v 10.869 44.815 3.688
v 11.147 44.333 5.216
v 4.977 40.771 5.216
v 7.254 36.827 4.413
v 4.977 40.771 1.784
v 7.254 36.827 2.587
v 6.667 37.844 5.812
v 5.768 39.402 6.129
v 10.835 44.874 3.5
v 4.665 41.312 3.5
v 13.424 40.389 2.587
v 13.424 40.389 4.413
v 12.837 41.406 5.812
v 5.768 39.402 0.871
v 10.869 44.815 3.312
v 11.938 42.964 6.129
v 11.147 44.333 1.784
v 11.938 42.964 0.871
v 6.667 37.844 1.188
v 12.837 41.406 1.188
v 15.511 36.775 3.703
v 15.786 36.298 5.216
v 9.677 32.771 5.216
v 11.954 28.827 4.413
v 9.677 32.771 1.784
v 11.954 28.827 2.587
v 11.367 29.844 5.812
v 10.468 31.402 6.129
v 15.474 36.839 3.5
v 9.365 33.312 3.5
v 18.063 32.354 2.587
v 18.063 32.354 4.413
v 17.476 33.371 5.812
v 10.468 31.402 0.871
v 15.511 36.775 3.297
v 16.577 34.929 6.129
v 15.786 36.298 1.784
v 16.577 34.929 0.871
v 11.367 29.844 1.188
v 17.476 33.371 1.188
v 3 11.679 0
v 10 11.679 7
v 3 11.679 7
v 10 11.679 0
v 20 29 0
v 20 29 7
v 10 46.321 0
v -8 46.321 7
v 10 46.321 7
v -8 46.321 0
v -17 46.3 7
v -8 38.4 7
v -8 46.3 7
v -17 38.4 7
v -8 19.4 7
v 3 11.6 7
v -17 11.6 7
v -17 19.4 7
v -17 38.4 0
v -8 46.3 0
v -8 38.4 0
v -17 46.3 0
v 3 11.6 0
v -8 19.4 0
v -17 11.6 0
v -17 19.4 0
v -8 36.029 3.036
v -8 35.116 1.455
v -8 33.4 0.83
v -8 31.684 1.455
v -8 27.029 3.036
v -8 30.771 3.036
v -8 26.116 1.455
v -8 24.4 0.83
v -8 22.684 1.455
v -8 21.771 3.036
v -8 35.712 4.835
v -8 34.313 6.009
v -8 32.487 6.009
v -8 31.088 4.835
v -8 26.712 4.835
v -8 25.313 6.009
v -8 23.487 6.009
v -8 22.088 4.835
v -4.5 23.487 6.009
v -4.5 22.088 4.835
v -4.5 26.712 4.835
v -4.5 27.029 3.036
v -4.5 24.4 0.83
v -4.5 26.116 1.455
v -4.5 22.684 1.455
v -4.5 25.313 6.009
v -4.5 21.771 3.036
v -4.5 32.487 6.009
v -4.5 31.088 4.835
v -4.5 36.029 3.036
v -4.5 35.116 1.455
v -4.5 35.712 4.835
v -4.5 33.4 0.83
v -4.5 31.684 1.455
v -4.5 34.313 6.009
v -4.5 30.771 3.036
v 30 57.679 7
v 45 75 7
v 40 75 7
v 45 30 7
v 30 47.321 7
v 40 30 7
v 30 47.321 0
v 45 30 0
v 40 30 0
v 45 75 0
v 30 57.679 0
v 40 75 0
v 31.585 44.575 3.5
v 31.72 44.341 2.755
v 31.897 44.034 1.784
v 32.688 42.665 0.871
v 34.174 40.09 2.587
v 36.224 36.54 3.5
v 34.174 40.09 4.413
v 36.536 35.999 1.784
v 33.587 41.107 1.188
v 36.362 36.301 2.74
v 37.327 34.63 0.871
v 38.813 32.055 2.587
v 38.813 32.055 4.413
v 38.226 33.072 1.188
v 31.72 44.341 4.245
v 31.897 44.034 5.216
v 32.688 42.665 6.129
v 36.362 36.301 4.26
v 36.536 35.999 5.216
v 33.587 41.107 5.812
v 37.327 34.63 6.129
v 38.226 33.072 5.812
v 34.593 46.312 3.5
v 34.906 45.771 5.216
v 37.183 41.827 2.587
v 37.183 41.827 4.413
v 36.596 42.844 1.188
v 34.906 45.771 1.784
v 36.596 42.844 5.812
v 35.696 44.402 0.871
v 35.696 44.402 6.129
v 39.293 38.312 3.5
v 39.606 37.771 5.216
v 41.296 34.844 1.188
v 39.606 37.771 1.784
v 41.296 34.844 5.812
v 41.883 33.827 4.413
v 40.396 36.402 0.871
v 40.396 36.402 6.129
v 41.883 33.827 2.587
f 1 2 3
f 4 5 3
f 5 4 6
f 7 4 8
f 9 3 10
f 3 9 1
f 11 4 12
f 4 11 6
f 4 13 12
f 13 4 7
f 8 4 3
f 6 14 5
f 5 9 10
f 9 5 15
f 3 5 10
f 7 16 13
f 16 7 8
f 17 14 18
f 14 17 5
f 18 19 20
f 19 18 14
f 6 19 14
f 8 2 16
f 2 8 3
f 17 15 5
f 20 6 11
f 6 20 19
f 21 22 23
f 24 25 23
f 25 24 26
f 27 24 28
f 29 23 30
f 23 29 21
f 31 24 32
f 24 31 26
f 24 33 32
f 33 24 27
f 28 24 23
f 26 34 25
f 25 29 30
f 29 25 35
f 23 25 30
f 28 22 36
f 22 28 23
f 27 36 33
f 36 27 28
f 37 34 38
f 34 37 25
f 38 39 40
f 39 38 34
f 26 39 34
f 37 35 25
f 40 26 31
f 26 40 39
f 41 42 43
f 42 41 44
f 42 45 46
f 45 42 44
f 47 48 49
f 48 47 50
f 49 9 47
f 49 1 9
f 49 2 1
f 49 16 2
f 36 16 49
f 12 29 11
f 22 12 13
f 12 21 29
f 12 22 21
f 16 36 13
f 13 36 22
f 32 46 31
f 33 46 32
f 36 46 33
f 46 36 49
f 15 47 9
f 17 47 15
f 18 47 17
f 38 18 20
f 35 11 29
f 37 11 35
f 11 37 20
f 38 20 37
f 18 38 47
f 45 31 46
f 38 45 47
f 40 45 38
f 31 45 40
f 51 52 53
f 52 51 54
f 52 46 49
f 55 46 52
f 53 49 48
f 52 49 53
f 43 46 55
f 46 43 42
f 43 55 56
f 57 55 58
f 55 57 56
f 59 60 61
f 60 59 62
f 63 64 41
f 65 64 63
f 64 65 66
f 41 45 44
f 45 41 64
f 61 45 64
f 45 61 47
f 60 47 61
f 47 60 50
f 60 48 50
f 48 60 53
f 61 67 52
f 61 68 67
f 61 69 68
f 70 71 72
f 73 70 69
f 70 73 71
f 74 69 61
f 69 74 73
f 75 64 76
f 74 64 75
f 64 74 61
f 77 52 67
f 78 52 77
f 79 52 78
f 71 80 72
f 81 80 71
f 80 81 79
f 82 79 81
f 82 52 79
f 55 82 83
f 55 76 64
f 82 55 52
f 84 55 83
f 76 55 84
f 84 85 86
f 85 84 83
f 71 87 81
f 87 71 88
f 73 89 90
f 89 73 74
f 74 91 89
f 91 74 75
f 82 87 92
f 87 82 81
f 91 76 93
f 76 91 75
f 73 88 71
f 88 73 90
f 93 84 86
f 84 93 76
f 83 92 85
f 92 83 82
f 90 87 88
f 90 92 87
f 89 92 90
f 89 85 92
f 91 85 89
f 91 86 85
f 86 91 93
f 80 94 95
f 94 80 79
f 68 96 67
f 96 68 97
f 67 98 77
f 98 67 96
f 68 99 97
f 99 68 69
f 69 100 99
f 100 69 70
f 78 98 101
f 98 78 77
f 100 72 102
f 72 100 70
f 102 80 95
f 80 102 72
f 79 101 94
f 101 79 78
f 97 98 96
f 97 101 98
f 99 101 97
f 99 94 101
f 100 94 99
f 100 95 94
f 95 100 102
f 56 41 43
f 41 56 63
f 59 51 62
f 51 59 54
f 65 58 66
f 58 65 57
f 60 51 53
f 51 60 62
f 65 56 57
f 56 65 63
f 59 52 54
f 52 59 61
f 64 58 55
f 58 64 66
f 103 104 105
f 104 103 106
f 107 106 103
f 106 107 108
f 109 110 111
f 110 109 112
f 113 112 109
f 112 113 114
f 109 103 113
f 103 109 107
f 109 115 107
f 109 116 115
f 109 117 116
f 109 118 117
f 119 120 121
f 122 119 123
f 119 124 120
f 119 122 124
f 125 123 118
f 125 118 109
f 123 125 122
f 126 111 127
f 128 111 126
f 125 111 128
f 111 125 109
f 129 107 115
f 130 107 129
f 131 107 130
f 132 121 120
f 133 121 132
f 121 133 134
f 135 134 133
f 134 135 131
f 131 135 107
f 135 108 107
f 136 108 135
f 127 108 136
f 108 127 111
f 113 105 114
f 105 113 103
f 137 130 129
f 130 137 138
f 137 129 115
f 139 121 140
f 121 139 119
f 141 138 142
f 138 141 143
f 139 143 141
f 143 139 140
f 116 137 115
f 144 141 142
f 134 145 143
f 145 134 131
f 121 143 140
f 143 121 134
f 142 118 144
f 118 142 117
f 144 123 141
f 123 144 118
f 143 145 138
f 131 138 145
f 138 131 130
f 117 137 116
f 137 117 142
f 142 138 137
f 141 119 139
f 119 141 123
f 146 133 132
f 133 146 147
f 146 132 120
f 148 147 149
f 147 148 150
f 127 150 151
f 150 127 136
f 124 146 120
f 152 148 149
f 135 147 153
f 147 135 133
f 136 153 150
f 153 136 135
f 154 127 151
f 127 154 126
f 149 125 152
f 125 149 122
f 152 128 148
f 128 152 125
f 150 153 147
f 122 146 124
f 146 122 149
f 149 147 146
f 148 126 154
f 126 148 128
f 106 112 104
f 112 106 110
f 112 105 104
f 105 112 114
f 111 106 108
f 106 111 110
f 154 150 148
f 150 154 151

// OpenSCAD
d=2.67; //Гнездо для магнита диаметром 2.67 мм      
z=7;  //высота
g=3.5; //глубина дырок 
//дексибироза
translate ([0, 79, 0]) {
difference () {
translate([0, -50, 0]) cylinder(z, 20, 20, $fn=6);
translate ([-28, -73, -1]) cube ([20, 45, 9]);
rotate([0, 90, 0]) translate([-3.5, -54.6, -17+g]) cylinder(9, d, d); // Гнездо для магнита диаметром 2.67 мм      
rotate([0, 90, 0]) translate([-3.5, -45.6, -17+g]) cylinder(9, d, d); //  Гнездо для магнита диаметром 2.67 мм    
translate ([2, -80, 0]) {
translate ([4, 40, g]) rotate ([90, 0, 120]) cylinder(4.5+g, d, d);   
translate ([4+4.7, 37.5+-9+g, g]) rotate ([90, 0, 120]) cylinder(4.5+3.5, d, d); 
  }  
 }
difference () {
translate ([-17, -67.4, 0]) cube ([20, 34.7, 7]);
translate ([-20, -59.6, -1]) cube ([20, 19, 12]);
 }
}

//фосфор
translate ([25, 0, 0]) {
difference () {
translate ([5, 30, 0]) cube ([10, 45, z]);
translate ([-5, 30, -1]) cylinder(z+2, 20, 20, $fn=6);
translate ([-5, 75, -1]) cylinder(z+2, 20, 20, $fn=6);
translate ([4, 40, g]) rotate ([90, 0, 120]) cylinder(4.5+g, d, d);   
translate ([4+4.7, 37.5+-9+g, 3.5]) rotate ([90, 0, 120]) cylinder(4.5+3.5, d, d); 
  }
//вырезание дырки из доп части от фосфра
difference () {
translate ([15, 30, 0]) cube ([5, 45, z]);
translate ([9.7-5, -9+g, 0]) {
translate ([4, 37.5, g]) rotate ([90, 0, 120]) cylinder(4.5+3.5, d, d); 
  }
 }
}
